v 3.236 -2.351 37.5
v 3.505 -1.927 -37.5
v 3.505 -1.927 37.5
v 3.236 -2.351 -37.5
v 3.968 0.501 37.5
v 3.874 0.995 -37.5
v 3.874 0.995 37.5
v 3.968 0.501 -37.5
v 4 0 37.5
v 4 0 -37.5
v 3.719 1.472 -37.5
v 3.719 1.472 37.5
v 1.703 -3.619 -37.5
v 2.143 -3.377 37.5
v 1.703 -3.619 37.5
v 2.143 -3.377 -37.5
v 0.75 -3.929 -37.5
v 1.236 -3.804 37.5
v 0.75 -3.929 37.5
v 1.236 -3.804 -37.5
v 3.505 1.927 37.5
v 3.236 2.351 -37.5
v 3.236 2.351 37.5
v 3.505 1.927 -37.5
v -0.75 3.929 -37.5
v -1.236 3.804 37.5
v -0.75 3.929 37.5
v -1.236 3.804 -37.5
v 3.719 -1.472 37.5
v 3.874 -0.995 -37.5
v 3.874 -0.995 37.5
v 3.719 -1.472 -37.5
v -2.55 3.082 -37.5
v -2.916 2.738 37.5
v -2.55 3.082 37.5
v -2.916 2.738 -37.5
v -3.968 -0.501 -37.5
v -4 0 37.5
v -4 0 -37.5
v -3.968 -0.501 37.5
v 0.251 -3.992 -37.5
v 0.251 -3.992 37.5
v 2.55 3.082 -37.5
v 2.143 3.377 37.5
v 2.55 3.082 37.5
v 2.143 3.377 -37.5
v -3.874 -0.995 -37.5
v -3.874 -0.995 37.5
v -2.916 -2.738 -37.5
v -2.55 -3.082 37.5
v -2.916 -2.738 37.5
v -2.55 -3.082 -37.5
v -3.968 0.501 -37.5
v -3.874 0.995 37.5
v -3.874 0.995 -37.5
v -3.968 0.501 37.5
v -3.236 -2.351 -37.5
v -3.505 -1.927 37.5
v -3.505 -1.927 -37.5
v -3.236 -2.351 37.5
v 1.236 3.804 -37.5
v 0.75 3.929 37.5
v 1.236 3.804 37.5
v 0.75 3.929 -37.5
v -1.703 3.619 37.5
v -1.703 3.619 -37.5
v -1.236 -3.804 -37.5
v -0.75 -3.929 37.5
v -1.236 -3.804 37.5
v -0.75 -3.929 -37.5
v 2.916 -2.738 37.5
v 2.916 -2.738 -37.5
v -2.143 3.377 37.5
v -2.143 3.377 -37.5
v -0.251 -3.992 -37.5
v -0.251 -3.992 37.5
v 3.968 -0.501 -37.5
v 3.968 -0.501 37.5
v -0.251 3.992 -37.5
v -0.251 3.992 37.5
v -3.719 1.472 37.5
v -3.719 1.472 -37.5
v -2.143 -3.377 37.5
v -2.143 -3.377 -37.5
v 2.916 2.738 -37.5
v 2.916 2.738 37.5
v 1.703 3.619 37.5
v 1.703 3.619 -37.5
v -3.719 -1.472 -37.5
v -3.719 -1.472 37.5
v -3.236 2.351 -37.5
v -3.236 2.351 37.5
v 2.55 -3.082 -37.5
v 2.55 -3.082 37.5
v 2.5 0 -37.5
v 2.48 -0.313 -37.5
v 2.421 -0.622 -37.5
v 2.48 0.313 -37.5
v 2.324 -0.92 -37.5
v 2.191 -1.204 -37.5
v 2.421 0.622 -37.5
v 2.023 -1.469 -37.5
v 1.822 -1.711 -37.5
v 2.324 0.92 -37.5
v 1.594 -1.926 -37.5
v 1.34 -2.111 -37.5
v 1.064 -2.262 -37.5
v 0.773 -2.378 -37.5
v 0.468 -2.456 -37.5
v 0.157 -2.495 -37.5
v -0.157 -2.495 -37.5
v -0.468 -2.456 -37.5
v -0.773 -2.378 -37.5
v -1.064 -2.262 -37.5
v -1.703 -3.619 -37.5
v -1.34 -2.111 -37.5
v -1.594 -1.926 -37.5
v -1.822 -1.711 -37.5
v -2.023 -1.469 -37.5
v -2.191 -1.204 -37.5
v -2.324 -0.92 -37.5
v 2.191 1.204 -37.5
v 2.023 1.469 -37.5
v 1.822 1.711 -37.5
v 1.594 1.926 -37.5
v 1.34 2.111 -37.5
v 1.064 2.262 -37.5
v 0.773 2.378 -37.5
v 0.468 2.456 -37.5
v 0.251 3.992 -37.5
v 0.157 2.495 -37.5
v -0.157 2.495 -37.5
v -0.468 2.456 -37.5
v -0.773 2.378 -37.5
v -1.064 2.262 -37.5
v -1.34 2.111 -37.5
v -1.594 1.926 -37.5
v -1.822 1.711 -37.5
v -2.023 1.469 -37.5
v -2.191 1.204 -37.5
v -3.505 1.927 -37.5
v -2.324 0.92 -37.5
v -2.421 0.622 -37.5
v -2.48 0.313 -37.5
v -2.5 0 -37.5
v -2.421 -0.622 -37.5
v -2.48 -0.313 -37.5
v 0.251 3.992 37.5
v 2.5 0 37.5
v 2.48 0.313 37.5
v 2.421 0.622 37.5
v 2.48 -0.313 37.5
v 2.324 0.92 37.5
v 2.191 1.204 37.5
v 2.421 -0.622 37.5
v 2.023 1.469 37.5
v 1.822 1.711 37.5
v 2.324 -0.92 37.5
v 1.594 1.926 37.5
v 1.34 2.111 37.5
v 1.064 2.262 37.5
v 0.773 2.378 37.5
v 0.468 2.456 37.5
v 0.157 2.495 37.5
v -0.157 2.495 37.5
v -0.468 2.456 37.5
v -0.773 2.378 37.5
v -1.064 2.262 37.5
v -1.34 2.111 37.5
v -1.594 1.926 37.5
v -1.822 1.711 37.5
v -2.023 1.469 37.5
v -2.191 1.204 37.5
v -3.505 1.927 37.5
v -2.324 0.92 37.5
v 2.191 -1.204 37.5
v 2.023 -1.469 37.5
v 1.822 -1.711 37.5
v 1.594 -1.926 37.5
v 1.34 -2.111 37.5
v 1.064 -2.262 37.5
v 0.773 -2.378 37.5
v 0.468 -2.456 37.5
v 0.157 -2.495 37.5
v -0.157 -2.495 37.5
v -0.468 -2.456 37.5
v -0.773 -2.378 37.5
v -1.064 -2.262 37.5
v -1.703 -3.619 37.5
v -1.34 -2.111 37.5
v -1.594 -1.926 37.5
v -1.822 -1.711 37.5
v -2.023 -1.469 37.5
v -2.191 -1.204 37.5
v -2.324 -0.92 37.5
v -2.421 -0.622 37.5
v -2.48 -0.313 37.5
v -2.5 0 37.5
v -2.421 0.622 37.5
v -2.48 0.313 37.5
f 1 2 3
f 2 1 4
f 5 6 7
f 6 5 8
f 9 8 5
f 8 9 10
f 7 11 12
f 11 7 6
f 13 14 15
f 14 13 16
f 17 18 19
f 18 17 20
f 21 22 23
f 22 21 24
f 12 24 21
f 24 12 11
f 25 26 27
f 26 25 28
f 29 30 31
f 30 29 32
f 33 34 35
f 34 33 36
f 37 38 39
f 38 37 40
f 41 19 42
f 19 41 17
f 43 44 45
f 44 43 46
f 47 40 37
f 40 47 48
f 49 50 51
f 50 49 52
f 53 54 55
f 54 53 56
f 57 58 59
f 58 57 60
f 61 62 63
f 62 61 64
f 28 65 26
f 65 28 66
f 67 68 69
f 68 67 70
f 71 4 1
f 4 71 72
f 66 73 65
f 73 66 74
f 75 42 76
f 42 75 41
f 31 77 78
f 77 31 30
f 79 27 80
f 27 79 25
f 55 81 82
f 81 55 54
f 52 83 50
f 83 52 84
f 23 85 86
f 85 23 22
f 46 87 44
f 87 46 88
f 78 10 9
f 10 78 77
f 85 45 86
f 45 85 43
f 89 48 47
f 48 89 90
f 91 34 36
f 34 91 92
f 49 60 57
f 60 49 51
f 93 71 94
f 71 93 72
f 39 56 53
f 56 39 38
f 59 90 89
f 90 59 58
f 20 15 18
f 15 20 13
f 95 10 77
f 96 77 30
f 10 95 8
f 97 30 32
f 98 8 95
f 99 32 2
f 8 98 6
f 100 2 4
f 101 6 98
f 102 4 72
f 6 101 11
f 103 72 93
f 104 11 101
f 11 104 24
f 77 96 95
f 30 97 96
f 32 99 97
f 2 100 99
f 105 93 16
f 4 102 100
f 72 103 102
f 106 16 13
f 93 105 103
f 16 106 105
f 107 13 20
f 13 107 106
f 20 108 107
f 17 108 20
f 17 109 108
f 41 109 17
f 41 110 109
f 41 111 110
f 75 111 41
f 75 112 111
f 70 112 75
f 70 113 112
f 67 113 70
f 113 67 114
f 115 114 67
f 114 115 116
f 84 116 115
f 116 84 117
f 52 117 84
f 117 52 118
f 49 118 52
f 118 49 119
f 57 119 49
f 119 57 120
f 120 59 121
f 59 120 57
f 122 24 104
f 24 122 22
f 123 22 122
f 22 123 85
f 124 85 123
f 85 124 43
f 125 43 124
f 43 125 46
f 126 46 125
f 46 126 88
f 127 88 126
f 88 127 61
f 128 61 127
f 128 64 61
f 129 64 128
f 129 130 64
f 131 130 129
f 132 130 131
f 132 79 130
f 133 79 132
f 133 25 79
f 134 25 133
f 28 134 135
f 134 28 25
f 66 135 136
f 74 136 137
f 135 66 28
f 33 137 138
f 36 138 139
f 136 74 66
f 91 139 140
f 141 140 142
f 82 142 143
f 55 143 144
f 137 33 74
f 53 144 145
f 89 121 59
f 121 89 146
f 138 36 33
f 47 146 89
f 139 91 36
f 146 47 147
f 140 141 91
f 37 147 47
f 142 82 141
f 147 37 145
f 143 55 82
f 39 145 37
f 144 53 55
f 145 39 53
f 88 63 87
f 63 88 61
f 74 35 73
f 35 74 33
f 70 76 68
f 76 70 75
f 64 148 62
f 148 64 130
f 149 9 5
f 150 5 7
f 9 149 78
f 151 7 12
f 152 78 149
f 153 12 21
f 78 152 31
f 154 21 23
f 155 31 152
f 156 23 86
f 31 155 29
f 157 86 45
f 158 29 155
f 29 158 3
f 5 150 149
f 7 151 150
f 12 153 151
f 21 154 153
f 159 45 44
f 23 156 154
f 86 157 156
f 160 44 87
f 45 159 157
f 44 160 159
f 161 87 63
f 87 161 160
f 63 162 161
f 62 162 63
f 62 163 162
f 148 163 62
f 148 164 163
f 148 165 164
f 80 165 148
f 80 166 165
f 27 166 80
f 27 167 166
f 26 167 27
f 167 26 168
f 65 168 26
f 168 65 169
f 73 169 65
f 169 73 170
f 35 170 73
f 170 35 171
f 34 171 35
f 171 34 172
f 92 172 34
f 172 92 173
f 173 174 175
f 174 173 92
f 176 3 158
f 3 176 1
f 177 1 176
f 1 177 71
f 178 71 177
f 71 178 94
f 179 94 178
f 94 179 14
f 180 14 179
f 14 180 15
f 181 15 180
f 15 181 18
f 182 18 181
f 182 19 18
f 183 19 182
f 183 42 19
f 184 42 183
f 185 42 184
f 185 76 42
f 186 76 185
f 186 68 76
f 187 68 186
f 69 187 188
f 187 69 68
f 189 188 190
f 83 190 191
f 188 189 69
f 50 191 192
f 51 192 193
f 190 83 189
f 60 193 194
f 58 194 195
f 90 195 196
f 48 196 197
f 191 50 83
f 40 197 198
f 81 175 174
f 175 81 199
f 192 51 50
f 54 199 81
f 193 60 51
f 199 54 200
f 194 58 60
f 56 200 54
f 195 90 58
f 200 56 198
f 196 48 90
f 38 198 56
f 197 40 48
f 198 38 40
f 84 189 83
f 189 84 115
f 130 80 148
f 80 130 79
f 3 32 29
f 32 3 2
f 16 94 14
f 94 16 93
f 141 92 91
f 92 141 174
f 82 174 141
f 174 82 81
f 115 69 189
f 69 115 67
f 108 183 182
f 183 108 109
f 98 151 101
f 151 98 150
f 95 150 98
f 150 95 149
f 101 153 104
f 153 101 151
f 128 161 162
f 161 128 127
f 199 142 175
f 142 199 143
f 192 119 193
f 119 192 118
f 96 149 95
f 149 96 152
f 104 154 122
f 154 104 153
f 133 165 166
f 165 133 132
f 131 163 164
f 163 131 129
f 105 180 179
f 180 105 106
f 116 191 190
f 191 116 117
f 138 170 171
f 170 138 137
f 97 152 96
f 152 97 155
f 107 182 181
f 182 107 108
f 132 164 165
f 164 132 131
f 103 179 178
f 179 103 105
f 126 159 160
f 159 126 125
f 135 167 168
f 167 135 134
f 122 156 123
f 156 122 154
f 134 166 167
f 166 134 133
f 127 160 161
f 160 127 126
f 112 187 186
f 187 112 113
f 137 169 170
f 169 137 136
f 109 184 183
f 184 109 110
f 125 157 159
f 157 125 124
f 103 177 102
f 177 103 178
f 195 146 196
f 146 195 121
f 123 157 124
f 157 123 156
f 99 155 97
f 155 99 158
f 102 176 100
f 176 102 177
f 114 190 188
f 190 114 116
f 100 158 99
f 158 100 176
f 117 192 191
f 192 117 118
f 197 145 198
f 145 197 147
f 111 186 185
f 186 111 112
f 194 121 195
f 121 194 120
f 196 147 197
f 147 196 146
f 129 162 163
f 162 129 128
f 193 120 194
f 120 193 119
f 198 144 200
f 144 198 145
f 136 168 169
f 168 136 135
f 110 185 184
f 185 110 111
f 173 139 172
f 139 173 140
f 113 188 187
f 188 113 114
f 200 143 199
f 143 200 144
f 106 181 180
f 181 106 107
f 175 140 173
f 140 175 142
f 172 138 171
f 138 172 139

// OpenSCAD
$fn = 50;


difference() {
	union() {
		translate(v = [0, 0, -37.5000000000]) {
			cylinder(h = 75, r = 4.0000000000);
		}
	}
	union() {
		translate(v = [0, 0, -100.0000000000]) {
			cylinder(h = 200, r = 2.5000000000);
		}
	}
}
